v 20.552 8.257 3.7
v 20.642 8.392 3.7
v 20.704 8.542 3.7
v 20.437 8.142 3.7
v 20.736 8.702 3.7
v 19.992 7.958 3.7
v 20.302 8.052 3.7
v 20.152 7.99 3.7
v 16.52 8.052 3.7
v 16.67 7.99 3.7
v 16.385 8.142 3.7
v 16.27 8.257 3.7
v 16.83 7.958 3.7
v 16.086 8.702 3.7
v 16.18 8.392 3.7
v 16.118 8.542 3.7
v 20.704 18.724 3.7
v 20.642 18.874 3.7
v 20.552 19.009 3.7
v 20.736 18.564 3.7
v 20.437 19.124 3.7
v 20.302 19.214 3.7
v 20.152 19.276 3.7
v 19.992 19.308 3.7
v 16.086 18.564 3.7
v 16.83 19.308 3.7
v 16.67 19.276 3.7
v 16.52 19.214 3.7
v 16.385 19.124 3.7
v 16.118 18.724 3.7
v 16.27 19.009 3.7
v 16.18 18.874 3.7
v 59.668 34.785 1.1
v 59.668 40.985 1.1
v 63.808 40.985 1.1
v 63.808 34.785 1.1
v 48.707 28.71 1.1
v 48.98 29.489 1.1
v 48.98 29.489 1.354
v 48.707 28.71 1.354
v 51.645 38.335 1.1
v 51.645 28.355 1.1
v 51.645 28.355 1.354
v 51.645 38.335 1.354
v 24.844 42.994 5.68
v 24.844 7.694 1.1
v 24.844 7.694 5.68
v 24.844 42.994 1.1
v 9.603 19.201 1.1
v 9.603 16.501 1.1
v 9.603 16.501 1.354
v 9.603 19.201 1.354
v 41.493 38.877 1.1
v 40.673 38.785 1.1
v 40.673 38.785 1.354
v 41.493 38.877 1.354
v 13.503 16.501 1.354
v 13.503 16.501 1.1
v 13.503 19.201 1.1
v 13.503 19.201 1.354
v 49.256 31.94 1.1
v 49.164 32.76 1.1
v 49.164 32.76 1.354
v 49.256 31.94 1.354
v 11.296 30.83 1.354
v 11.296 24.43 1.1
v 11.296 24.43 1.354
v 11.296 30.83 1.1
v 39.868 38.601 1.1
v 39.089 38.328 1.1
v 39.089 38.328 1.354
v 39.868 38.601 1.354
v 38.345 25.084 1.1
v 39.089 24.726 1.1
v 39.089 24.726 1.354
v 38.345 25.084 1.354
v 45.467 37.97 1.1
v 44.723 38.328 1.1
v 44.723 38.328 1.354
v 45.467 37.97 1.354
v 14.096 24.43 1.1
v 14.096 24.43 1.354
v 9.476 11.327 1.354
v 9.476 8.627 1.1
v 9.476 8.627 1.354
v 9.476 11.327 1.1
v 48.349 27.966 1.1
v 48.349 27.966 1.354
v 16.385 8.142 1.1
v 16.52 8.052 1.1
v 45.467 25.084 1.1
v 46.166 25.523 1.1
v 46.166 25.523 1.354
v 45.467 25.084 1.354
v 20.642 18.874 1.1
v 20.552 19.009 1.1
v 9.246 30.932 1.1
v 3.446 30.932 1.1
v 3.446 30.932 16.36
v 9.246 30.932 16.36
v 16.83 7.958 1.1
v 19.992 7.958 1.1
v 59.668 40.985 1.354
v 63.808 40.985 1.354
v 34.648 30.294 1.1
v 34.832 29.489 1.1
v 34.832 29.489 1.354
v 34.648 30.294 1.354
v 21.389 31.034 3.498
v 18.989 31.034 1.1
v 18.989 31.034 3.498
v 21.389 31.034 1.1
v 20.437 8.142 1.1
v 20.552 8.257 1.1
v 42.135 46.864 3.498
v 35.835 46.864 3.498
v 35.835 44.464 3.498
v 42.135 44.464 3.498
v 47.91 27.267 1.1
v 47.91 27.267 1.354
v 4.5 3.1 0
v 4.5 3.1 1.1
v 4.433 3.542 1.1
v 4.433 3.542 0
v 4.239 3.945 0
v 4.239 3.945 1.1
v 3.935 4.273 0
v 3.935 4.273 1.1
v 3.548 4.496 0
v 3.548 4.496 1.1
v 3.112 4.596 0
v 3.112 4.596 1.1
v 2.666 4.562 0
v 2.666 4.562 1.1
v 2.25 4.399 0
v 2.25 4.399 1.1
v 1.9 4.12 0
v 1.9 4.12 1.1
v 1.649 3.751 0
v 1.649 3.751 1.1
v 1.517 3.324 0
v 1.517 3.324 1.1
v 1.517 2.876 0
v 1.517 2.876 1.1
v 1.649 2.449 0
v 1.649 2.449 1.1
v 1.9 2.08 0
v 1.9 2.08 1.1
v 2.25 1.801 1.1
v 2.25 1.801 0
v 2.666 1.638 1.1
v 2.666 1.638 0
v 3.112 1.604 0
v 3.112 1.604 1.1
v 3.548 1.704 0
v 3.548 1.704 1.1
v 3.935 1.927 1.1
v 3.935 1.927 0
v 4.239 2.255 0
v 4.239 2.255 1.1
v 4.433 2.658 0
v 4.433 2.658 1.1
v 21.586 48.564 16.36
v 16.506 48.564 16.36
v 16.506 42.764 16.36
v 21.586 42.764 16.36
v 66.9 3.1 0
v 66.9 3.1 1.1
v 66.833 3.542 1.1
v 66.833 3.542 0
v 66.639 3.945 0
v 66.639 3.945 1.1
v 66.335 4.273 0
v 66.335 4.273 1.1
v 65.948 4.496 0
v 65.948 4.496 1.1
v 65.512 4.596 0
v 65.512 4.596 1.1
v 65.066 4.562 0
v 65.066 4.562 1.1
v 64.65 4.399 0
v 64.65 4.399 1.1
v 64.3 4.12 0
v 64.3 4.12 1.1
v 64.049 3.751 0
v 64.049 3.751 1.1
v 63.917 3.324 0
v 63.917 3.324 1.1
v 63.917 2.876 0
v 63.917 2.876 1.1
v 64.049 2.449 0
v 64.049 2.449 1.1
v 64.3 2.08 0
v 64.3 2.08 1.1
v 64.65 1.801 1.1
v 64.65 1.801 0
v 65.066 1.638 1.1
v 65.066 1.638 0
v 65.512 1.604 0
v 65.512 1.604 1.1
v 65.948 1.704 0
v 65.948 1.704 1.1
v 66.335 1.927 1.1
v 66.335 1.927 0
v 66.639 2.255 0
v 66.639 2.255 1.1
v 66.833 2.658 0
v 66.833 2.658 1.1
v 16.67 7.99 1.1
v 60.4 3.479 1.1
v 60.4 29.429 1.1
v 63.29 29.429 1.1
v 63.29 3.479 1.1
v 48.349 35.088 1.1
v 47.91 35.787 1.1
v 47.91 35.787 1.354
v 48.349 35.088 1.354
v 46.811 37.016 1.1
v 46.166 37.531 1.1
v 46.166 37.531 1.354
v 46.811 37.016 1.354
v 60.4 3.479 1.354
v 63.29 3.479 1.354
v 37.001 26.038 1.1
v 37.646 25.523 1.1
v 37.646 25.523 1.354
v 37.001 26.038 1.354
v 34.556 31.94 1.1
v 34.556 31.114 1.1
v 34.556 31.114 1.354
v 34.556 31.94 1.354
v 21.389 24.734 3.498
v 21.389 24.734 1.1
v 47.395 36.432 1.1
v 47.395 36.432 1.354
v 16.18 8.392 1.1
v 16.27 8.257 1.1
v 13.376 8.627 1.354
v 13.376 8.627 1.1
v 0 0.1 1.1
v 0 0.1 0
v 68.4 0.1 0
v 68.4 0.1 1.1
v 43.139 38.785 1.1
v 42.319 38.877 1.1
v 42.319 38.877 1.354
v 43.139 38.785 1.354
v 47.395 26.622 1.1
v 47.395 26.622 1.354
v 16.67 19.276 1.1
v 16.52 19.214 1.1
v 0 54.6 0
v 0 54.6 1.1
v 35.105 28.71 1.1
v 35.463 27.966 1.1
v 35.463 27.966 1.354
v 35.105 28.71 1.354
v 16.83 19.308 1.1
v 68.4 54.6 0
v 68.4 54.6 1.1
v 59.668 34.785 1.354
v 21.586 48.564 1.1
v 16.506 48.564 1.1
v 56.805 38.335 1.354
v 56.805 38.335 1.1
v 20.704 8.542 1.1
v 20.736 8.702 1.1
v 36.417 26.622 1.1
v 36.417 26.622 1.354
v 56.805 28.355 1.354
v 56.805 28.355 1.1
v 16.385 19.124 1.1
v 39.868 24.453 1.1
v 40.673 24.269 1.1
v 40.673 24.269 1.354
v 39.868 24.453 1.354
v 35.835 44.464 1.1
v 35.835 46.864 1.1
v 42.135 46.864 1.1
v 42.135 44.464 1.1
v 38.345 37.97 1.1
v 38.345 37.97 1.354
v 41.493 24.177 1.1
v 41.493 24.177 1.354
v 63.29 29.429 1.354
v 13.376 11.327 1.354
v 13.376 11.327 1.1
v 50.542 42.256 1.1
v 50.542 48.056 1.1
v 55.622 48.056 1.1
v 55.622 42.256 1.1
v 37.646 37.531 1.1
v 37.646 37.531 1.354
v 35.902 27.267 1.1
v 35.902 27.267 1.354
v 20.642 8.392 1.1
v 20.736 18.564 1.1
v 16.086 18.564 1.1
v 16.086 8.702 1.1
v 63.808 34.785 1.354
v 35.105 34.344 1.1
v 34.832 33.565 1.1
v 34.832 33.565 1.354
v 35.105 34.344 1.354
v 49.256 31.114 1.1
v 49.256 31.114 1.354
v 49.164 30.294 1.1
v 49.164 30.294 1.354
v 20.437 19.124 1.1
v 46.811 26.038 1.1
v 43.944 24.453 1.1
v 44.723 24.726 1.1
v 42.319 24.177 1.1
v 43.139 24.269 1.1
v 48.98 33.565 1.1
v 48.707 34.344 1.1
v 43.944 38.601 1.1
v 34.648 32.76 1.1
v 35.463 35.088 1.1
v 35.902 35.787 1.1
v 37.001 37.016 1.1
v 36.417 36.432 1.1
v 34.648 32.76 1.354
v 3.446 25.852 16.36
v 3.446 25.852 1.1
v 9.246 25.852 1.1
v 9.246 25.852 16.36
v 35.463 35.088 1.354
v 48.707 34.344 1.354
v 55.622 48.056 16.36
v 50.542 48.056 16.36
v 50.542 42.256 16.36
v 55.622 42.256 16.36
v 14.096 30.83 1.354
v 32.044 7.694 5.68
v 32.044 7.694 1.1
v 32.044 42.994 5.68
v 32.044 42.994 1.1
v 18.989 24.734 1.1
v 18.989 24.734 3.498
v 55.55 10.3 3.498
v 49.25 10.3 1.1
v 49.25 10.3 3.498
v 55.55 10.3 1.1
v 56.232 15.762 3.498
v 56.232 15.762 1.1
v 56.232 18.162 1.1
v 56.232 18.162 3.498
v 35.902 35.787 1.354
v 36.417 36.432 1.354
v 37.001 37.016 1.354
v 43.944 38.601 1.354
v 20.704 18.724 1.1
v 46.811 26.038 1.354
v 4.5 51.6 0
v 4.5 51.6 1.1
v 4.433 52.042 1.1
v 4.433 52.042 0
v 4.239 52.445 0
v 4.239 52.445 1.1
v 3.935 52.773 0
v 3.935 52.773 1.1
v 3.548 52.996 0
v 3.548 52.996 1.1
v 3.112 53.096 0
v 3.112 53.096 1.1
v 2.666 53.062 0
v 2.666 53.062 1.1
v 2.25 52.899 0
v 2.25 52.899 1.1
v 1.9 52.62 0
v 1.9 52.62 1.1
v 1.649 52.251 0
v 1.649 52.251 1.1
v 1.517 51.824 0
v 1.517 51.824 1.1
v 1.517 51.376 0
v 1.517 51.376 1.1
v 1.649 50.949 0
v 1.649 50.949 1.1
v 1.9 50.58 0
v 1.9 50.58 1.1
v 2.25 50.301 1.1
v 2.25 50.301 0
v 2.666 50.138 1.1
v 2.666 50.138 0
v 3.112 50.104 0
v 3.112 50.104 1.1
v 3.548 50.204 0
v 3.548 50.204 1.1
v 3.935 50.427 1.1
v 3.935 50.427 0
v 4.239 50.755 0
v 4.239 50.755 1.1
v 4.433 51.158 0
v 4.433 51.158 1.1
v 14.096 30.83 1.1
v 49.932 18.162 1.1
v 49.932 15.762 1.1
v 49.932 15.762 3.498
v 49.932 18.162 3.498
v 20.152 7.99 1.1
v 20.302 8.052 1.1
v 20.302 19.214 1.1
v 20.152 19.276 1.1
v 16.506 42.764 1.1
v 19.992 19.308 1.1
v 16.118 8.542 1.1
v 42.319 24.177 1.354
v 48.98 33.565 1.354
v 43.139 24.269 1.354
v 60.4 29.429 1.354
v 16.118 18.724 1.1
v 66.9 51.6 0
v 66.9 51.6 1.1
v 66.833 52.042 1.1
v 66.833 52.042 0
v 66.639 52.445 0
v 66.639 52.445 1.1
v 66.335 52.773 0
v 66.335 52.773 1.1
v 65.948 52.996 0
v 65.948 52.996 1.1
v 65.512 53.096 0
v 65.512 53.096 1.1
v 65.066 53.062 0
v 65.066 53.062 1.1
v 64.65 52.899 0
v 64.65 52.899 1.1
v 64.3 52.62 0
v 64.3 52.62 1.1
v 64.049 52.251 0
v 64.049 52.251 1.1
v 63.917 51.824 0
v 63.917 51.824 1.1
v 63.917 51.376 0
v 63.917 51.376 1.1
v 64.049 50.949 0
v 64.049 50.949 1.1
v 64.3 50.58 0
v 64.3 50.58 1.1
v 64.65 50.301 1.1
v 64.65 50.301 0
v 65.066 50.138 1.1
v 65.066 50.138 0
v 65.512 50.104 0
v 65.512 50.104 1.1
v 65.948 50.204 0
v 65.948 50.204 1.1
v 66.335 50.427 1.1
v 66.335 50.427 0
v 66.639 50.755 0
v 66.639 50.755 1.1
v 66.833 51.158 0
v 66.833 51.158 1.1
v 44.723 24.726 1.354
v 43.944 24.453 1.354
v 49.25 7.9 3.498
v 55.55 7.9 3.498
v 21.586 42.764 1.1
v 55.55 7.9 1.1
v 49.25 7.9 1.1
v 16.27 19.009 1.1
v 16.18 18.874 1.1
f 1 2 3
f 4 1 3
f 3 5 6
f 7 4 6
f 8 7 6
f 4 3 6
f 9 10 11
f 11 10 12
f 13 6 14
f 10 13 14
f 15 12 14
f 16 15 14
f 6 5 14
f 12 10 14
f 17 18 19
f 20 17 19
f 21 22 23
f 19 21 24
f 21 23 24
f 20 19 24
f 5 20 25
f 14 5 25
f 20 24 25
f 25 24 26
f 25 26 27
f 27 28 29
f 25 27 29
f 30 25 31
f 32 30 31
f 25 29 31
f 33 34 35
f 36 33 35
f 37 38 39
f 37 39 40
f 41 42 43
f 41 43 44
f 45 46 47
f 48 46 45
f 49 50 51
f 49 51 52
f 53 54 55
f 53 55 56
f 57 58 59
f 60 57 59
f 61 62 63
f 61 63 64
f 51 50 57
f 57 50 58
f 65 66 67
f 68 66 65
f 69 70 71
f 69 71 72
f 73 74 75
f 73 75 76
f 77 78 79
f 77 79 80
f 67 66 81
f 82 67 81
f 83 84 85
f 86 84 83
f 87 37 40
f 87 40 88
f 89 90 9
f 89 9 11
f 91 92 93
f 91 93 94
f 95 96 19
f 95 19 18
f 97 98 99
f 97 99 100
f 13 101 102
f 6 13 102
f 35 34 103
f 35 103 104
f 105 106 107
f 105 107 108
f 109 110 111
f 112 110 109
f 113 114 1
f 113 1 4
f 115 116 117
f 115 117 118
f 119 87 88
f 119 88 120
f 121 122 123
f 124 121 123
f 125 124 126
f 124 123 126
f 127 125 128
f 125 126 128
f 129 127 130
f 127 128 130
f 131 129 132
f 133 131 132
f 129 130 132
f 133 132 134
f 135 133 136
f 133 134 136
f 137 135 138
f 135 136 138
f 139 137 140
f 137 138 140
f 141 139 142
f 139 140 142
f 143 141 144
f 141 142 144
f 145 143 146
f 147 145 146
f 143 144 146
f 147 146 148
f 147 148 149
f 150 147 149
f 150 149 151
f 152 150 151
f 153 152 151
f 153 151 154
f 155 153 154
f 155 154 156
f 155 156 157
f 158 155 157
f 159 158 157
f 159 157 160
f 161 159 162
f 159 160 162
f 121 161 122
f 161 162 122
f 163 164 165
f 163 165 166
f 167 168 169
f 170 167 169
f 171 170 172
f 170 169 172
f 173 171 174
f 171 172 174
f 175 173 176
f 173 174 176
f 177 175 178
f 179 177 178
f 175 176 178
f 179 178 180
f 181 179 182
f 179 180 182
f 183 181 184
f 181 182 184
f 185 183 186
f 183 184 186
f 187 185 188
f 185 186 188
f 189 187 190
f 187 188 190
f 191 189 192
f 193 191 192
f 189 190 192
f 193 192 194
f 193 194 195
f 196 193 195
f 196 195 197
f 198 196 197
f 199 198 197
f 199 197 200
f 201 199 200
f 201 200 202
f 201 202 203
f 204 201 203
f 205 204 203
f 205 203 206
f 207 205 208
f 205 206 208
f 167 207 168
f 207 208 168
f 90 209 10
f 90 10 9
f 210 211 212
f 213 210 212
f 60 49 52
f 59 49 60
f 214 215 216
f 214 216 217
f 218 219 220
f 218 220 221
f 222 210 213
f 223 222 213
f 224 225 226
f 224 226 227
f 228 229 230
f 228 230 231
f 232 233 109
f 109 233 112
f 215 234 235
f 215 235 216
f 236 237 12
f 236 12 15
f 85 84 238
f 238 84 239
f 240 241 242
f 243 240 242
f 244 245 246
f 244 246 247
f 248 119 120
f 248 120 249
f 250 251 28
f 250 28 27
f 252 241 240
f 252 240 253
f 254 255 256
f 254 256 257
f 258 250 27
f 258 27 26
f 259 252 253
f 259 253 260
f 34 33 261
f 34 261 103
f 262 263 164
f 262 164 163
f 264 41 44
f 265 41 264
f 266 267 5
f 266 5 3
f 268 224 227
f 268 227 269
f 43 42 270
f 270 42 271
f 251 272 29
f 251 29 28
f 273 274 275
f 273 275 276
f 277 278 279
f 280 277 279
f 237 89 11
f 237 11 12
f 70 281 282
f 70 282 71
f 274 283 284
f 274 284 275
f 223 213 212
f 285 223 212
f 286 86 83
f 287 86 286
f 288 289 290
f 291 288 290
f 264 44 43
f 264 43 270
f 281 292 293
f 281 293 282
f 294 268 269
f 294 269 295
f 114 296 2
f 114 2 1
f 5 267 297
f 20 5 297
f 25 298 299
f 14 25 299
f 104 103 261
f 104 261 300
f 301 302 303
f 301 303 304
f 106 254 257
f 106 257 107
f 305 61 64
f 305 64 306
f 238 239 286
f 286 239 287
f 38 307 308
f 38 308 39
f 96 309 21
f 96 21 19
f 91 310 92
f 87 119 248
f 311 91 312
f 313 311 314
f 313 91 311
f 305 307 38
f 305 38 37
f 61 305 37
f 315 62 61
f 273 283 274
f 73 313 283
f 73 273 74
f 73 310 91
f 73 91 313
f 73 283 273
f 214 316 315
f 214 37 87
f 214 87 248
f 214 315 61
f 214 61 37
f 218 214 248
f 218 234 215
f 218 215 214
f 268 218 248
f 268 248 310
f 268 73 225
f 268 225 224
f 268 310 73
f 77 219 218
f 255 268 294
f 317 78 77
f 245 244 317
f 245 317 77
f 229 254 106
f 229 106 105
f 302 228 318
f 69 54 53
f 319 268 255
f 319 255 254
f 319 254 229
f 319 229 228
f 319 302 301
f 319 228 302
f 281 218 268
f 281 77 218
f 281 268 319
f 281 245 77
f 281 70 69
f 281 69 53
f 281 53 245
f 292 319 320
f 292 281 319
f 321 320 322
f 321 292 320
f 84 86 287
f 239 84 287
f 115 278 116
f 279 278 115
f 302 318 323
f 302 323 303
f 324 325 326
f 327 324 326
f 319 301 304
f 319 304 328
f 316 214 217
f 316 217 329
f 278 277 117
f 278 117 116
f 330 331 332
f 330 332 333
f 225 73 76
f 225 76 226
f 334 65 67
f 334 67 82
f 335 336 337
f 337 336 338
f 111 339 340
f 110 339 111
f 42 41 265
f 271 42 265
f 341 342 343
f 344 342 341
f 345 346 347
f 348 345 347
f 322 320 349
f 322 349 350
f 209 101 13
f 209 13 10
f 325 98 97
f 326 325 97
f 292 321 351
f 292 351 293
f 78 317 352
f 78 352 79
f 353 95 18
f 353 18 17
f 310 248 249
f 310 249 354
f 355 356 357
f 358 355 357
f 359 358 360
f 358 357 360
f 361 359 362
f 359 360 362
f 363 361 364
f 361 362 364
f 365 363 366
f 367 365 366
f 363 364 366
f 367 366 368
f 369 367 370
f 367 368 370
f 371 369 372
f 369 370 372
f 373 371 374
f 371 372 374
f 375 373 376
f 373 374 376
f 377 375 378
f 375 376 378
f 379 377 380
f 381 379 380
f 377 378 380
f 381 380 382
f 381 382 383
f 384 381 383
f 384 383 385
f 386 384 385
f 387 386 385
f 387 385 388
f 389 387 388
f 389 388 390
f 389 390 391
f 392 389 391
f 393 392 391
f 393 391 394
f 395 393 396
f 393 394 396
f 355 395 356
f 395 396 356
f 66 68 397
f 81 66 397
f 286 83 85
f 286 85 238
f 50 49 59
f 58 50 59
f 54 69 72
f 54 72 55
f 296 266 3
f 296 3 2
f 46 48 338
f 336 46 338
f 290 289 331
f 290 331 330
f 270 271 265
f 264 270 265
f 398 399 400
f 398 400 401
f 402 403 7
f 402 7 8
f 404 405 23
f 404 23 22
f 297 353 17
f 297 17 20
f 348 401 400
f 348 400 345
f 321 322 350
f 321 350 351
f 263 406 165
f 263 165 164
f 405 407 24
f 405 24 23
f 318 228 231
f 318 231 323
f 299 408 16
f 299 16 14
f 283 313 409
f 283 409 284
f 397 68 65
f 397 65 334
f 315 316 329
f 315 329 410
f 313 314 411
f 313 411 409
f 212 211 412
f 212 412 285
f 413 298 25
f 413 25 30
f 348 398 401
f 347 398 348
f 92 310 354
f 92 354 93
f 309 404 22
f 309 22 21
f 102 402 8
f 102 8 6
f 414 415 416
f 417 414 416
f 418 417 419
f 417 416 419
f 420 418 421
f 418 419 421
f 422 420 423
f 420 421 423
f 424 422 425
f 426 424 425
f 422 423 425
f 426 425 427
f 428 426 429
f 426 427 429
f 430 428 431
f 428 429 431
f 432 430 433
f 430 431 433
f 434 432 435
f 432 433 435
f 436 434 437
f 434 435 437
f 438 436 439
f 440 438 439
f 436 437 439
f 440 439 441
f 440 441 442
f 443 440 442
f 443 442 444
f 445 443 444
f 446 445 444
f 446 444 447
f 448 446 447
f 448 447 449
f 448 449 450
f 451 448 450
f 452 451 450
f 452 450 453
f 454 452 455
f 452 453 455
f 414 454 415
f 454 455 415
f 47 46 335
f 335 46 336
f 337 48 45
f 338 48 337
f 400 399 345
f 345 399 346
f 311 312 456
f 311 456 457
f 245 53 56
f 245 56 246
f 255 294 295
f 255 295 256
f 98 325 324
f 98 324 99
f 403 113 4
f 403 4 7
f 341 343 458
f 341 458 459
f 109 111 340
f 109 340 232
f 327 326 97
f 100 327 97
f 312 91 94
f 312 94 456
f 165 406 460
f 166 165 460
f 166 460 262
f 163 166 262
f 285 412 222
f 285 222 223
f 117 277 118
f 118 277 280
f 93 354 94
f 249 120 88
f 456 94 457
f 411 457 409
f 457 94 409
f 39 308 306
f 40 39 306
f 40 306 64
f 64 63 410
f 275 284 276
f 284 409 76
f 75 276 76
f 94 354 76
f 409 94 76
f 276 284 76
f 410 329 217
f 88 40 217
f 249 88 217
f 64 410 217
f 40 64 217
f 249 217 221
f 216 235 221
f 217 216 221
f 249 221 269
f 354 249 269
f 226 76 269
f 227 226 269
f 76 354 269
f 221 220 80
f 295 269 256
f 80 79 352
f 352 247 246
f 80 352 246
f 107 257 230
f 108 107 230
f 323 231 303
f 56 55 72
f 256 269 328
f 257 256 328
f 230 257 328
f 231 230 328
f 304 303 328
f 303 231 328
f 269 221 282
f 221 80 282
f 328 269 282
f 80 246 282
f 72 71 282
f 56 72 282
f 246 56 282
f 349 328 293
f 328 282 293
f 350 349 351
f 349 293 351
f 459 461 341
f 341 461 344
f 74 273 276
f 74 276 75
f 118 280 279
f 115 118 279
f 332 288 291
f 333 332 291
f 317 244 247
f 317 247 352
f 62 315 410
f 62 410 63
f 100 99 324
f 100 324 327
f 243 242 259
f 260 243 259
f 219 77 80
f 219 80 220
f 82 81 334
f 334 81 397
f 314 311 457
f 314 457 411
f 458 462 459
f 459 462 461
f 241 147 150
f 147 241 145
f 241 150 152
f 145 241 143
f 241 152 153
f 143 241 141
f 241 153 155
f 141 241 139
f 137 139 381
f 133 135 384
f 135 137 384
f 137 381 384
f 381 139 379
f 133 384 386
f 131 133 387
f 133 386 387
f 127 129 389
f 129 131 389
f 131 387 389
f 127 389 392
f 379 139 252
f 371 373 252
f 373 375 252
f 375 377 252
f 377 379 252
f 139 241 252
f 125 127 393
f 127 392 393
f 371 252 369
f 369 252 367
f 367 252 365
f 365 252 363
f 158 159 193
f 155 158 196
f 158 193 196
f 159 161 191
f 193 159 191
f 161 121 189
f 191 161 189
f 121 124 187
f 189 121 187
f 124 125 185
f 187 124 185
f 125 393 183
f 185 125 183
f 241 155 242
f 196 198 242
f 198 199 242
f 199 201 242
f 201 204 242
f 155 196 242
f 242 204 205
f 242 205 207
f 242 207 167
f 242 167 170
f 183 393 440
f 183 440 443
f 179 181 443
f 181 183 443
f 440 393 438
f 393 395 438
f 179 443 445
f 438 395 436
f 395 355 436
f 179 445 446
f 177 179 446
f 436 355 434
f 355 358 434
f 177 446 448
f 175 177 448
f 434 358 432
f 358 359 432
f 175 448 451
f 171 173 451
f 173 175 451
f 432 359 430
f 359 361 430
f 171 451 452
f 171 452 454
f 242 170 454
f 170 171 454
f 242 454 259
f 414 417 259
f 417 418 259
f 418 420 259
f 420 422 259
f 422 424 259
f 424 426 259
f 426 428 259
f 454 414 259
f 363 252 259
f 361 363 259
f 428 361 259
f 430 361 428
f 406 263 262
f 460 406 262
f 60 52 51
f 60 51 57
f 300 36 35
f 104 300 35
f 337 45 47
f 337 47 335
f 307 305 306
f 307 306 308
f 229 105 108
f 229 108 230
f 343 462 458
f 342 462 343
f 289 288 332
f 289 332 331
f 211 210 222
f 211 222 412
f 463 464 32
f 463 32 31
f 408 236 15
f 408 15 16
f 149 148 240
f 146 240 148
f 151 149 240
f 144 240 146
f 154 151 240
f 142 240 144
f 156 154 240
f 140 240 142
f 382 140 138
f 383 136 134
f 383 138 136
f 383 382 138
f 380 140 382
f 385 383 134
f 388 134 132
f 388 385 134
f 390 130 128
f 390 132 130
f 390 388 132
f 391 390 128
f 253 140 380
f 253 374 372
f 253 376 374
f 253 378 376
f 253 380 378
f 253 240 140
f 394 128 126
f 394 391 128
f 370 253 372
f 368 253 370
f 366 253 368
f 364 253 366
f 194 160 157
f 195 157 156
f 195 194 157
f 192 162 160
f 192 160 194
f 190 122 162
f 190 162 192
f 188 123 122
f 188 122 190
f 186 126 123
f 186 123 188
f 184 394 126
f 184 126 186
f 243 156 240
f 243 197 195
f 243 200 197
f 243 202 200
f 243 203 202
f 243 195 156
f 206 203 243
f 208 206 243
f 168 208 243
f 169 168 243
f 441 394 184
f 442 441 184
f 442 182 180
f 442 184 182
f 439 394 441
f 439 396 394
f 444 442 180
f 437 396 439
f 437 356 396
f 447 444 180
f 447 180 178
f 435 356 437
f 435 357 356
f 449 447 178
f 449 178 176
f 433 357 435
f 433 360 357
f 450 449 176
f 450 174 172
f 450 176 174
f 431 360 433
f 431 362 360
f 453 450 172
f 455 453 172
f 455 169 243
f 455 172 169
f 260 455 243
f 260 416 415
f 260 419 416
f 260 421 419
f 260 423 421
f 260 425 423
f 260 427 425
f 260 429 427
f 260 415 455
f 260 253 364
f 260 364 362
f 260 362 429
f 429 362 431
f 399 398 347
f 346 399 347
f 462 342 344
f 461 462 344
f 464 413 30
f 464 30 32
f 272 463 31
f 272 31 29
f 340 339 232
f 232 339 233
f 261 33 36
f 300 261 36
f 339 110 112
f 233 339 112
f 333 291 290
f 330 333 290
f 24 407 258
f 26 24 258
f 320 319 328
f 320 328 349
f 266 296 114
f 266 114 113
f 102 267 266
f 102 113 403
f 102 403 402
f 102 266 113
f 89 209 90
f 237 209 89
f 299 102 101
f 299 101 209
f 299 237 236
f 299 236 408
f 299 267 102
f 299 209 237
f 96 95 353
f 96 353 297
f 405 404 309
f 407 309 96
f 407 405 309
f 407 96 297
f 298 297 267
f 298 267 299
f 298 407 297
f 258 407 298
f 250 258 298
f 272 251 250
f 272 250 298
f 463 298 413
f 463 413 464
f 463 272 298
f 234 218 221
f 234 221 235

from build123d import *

# Parameters (mm, degrees)
SKETCH1_W                     = 68.4
SKETCH1_H                     = 54.5
BOARD_DEPTH                   = 1.1
SKETCH2_W                     = 2.89
SKETCH2_H                     = 25.95
FP_61301011121_MFG_1_DEPTH    = 0.254
SKETCH3_W                     = 5.16
SKETCH3_H                     = 9.98
FP_3296W_MFG_1_DEPTH          = 0.254
SKETCH4_W                     = 6.3
SKETCH4_H                     = 2.4
RESA60_630X240_1_DEPTH        = 2.3984
SKETCH5_W                     = 6.3
SKETCH5_H                     = 2.4
RESA60_630X240_2_DEPTH        = 2.3984
SKETCH6_W                     = 2.4
SKETCH6_H                     = 6.3
RESA60_630X240_3_DEPTH        = 2.3984
SKETCH7_W                     = 6.3
SKETCH7_H                     = 2.4
RESA60_630X240_4_DEPTH        = 2.3984
SKETCH8_W                     = 5.08
SKETCH8_H                     = 5.7999
MOLX_22_27_2021_V_1_DEPTH     = 15.26
SKETCH9_W                     = 5.08
SKETCH9_H                     = 5.7999
MOLX_22_27_2021_V_2_DEPTH     = 15.26
SKETCH10_W                    = 5.7999
SKETCH10_H                    = 5.08
MOLX_22_27_2021_V_3_DEPTH     = 15.26
SKETCH14_W                    = 4.14
SKETCH14_H                    = 6.2
FP_TMM_103_03_T_S_MFG_1_DEPTH = 0.254
FOX_FOXSLF160_20_1_DEPTH      = 2.6
SKETCH16_W                    = 7.2
SKETCH16_H                    = 35.3
EXTRUDE_28P3_1_DEPTH          = 4.58
SKETCH17_W                    = 2.8
SKETCH17_H                    = 6.4
FP_K15H5_MFG_1_DEPTH          = 0.254
SKETCH18_W                    = 3.9
SKETCH18_H                    = 2.7
FP_RCE0DB_MFG_1_DEPTH         = 0.254
SKETCH19_W                    = 3.9
SKETCH19_H                    = 2.7
FP_RCE0DB_MFG_2_DEPTH         = 0.254
FP_PS1440P02BT_MFG_1_DEPTH    = 0.254
SKETCH21_R                    = 1.5
CUT_EXTRUDE1_DEPTH            = 1.1


with BuildPart() as part:
    # Sketch1 → BOARD (new body)
    with BuildSketch(Plane.XY):
        with Locations((34.2, 27.35)):
            Rectangle(SKETCH1_W, SKETCH1_H)
    extrude(amount=BOARD_DEPTH)

    # Sketch21 → Cut-Extrude1 (cut)
    with BuildSketch(Plane.XY.offset(1.1)):
        with Locations((65.4, 51.6)):
            Circle(SKETCH21_R)
        with Locations((3, 51.6)):
            Circle(SKETCH21_R)
        with Locations((3, 3.1)):
            Circle(SKETCH21_R)
        with Locations((65.4, 3.1)):
            Circle(SKETCH21_R)
    extrude(amount=-CUT_EXTRUDE1_DEPTH, mode=Mode.SUBTRACT)


with BuildPart() as body_2:
    # Sketch2 → FP-61301011121-MFG-1 (new body)
    with BuildSketch(Plane.XY.offset(1.1)):
        with Locations((61.845, 16.454)):
            Rectangle(SKETCH2_W, SKETCH2_H)
    extrude(amount=FP_61301011121_MFG_1_DEPTH)


with BuildPart() as body_3:
    # Sketch3 → FP-3296W-MFG-1 (new body)
    with BuildSketch(Plane.XY.offset(1.1)):
        with Locations((54.225, 33.345)):
            Rectangle(SKETCH3_W, SKETCH3_H)
    extrude(amount=FP_3296W_MFG_1_DEPTH)


with BuildPart() as body_4:
    # Sketch4 → RESA60-630X240-1 (new body)
    with BuildSketch(Plane.XY.offset(1.1)):
        with Locations((52.4, 9.1)):
            Rectangle(SKETCH4_W, SKETCH4_H)
    extrude(amount=RESA60_630X240_1_DEPTH)


with BuildPart() as body_5:
    # Sketch5 → RESA60-630X240-2 (new body)
    with BuildSketch(Plane.XY.offset(1.1)):
        with Locations((53.082, 16.962)):
            Rectangle(SKETCH5_W, SKETCH5_H)
    extrude(amount=RESA60_630X240_2_DEPTH)


with BuildPart() as body_6:
    # Sketch6 → RESA60-630X240-3 (new body)
    with BuildSketch(Plane.XY.offset(1.1)):
        with Locations((20.189, 27.884)):
            Rectangle(SKETCH6_W, SKETCH6_H)
    extrude(amount=RESA60_630X240_3_DEPTH)


with BuildPart() as body_7:
    # Sketch7 → RESA60-630X240-4 (new body)
    with BuildSketch(Plane.XY.offset(1.1)):
        with Locations((38.985, 45.664)):
            Rectangle(SKETCH7_W, SKETCH7_H)
    extrude(amount=RESA60_630X240_4_DEPTH)


with BuildPart() as body_8:
    # Sketch8 → MOLX-22-27-2021_V-1 (new body)
    with BuildSketch(Plane.XY.offset(1.1)):
        with Locations((53.0822, 45.15615)):
            Rectangle(SKETCH8_W, SKETCH8_H)
    extrude(amount=MOLX_22_27_2021_V_1_DEPTH)


with BuildPart() as body_9:
    # Sketch9 → MOLX-22-27-2021_V-2 (new body)
    with BuildSketch(Plane.XY.offset(1.1)):
        with Locations((19.0458, 45.66385)):
            Rectangle(SKETCH9_W, SKETCH9_H)
    extrude(amount=MOLX_22_27_2021_V_2_DEPTH)


with BuildPart() as body_10:
    # Sketch10 → MOLX-22-27-2021_V-3 (new body)
    with BuildSketch(Plane.XY.offset(1.1)):
        with Locations((6.34585, 28.3922)):
            Rectangle(SKETCH10_W, SKETCH10_H)
    extrude(amount=MOLX_22_27_2021_V_3_DEPTH)


with BuildPart() as body_11:
    # Sketch14 → FP-TMM-103-03-T-S-MFG-1 (new body)
    with BuildSketch(Plane.XY.offset(1.1)):
        with Locations((61.738, 37.885)):
            Rectangle(SKETCH14_W, SKETCH14_H)
    extrude(amount=FP_TMM_103_03_T_S_MFG_1_DEPTH)


with BuildPart() as body_12:
    # Sketch15 → FOX-FOXSLF160-20-1 (new body)
    with BuildSketch(Plane.XY.offset(1.1)):
        Polygon((20.1515, 19.2764), (20.3017, 19.2142), (20.4368, 19.1239), (20.5517, 19.009), (20.642, 18.8739), (20.7042, 18.7237), (20.7359, 18.5643), (20.7359, 18.4831), (20.7359, 8.7831), (20.7359, 8.7018), (20.7042, 8.5425), (20.642, 8.3923), (20.5517, 8.2572), (20.4368, 8.1423), (20.3017, 8.052), (20.1516, 7.9898), (19.9922, 7.9581), (19.9109, 7.9581), (16.9109, 7.9581), (16.8296, 7.9581), (16.6703, 7.9898), (16.5201, 8.052), (16.385, 8.1423), (16.2701, 8.2572), (16.1798, 8.3923), (16.1176, 8.5424), (16.0859, 8.7018), (16.0859, 8.783), (16.0859, 18.4831), (16.0859, 18.5643), (16.1176, 18.7237), (16.1798, 18.8739), (16.2701, 19.009), (16.385, 19.1239), (16.5201, 19.2142), (16.6703, 19.2764), (16.8296, 19.3081), (16.9109, 19.3081), (19.9109, 19.3081), (19.9921, 19.3081), align=None)
    extrude(amount=FOX_FOXSLF160_20_1_DEPTH)


with BuildPart() as body_13:
    # Sketch16 → Extrude 28P3-1 (new body)
    with BuildSketch(Plane.XY.offset(1.1)):
        with Locations((28.444, 25.344)):
            Rectangle(SKETCH16_W, SKETCH16_H)
    extrude(amount=EXTRUDE_28P3_1_DEPTH)


with BuildPart() as body_14:
    # Sketch17 → FP-K15H5-MFG-1 (new body)
    with BuildSketch(Plane.XY.offset(1.1)):
        with Locations((12.696, 27.63)):
            Rectangle(SKETCH17_W, SKETCH17_H)
    extrude(amount=FP_K15H5_MFG_1_DEPTH)


with BuildPart() as body_15:
    # Sketch18 → FP-RCE0DB-MFG-1 (new body)
    with BuildSketch(Plane.XY.offset(1.1)):
        with Locations((11.426, 9.977)):
            Rectangle(SKETCH18_W, SKETCH18_H)
    extrude(amount=FP_RCE0DB_MFG_1_DEPTH)


with BuildPart() as body_16:
    # Sketch19 → FP-RCE0DB-MFG-2 (new body)
    with BuildSketch(Plane.XY.offset(1.1)):
        with Locations((11.553, 17.851)):
            Rectangle(SKETCH19_W, SKETCH19_H)
    extrude(amount=FP_RCE0DB_MFG_2_DEPTH)


with BuildPart() as body_17:
    # Sketch20 → FP-PS1440P02BT-MFG-1 (new body)
    with BuildSketch(Plane.XY.offset(1.1)):
        Polygon((43.1391, 38.7846), (43.9439, 38.6009), (44.7232, 38.3282), (45.4669, 37.97), (46.1659, 37.5308), (46.8113, 37.0161), (47.3951, 36.4324), (47.9098, 35.7869), (48.349, 35.0879), (48.7072, 34.3442), (48.9799, 33.5649), (49.1636, 32.7601), (49.256, 31.9398), (49.256, 31.1142), (49.1636, 30.2939), (48.9799, 29.4891), (48.7072, 28.7099), (48.349, 27.9661), (47.9098, 27.2671), (47.3951, 26.6217), (46.8113, 26.0379), (46.1659, 25.5232), (45.4669, 25.084), (44.7232, 24.7258), (43.9439, 24.4531), (43.1391, 24.2694), (42.3188, 24.177), (41.4932, 24.177), (40.6729, 24.2694), (39.8681, 24.4531), (39.0888, 24.7258), (38.3451, 25.084), (37.6461, 25.5232), (37.0006, 26.0379), (36.4169, 26.6217), (35.9022, 27.2671), (35.463, 27.9661), (35.1048, 28.7099), (34.8321, 29.4891), (34.6484, 30.2939), (34.556, 31.1143), (34.556, 31.9398), (34.6484, 32.7601), (34.8321, 33.5649), (35.1048, 34.3442), (35.463, 35.0879), (35.9022, 35.7869), (36.4169, 36.4324), (37.0006, 37.0161), (37.6461, 37.5308), (38.3451, 37.97), (39.0888, 38.3282), (39.8681, 38.6009), (40.6729, 38.7846), (41.4932, 38.877), (42.3188, 38.877), align=None)
    extrude(amount=FP_PS1440P02BT_MFG_1_DEPTH)


solid = Compound([part.part, body_2.part, body_3.part, body_4.part, body_5.part, body_6.part, body_7.part, body_8.part, body_9.part, body_10.part, body_11.part, body_12.part, body_13.part, body_14.part, body_15.part, body_16.part, body_17.part])
